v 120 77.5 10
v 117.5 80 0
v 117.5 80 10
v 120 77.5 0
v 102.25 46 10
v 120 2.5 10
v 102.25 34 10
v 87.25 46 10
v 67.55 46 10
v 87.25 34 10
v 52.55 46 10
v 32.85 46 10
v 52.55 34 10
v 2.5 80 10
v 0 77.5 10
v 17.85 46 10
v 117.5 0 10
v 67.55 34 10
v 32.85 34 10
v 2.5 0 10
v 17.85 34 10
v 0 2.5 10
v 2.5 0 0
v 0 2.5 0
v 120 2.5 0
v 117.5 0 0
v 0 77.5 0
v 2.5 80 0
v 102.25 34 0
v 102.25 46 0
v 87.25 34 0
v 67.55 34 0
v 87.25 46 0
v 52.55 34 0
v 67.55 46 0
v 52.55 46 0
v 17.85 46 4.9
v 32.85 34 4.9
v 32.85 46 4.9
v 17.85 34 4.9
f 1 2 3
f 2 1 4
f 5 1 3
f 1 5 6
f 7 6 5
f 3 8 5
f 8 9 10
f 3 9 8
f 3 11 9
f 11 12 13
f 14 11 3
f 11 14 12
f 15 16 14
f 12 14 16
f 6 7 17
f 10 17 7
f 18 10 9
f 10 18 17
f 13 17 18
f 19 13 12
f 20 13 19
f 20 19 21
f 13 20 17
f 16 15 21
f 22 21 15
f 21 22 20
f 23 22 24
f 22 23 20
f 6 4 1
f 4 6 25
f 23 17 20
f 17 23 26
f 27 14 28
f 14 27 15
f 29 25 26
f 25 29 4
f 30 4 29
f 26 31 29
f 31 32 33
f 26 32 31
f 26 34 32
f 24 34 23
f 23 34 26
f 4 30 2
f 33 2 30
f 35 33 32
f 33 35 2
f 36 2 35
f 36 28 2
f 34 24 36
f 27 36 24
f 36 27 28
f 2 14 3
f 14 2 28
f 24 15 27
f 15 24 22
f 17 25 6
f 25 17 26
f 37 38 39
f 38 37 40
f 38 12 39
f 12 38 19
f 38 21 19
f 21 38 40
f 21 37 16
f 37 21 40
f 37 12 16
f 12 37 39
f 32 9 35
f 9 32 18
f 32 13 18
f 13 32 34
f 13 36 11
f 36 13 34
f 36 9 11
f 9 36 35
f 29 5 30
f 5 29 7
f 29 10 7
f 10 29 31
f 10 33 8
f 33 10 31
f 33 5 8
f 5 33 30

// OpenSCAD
$fn = 32;

// ----------------------------------------------------------------------
// Windowed plate: 3 voids, 120 x 80 x 10 mm
// ----------------------------------------------------------------------

// --- parameters (mm) ---
plate_l = 120;            // plate length, X
plate_w = 80;             // plate width, Y
plate_t = 10;             // plate thickness, Z
edge_margin = 8;          // wall from the plate edge to any window
windows = 3;              // number of windows in the row
win_l = 15;               // window length
win_w = 12;               // window width
win_pitch = 34.7;         // window pitch along X
depth_1 = 5.1;            // depth of void 1 (full thickness = through)
depth_2 = 10;             // depth of void 2 (full thickness = through)
depth_3 = 10;             // depth of void 3 (full thickness = through)
corner_c = 2.5;           // corner chamfer of the plate

profile = [[2.5, 0], [117.5, 0], [120, 2.5], [120, 77.5], [117.5, 80], [2.5, 80], [0, 77.5], [0, 2.5]];  // primary outline, 8 points, counter clockwise
void_1 = [[17.85, 34], [32.85, 34], [32.85, 46], [17.85, 46]];  // window 1 of the row, 4 points
void_2 = [[52.55, 34], [67.55, 34], [67.55, 46], [52.55, 46]];  // window 2 of the row, 4 points
void_3 = [[87.25, 34], [102.25, 34], [102.25, 46], [87.25, 46]];  // window 3 of the row, 4 points

// --- the one profile operation ---
difference() {
  linear_extrude(height = plate_t) polygon(points = profile);
  translate([0, 0, plate_t - depth_1])
    linear_extrude(height = depth_1 + 1) polygon(points = void_1);
  translate([0, 0, -1])
    linear_extrude(height = plate_t + 2) polygon(points = void_2);
  translate([0, 0, -1])
    linear_extrude(height = plate_t + 2) polygon(points = void_3);
}
